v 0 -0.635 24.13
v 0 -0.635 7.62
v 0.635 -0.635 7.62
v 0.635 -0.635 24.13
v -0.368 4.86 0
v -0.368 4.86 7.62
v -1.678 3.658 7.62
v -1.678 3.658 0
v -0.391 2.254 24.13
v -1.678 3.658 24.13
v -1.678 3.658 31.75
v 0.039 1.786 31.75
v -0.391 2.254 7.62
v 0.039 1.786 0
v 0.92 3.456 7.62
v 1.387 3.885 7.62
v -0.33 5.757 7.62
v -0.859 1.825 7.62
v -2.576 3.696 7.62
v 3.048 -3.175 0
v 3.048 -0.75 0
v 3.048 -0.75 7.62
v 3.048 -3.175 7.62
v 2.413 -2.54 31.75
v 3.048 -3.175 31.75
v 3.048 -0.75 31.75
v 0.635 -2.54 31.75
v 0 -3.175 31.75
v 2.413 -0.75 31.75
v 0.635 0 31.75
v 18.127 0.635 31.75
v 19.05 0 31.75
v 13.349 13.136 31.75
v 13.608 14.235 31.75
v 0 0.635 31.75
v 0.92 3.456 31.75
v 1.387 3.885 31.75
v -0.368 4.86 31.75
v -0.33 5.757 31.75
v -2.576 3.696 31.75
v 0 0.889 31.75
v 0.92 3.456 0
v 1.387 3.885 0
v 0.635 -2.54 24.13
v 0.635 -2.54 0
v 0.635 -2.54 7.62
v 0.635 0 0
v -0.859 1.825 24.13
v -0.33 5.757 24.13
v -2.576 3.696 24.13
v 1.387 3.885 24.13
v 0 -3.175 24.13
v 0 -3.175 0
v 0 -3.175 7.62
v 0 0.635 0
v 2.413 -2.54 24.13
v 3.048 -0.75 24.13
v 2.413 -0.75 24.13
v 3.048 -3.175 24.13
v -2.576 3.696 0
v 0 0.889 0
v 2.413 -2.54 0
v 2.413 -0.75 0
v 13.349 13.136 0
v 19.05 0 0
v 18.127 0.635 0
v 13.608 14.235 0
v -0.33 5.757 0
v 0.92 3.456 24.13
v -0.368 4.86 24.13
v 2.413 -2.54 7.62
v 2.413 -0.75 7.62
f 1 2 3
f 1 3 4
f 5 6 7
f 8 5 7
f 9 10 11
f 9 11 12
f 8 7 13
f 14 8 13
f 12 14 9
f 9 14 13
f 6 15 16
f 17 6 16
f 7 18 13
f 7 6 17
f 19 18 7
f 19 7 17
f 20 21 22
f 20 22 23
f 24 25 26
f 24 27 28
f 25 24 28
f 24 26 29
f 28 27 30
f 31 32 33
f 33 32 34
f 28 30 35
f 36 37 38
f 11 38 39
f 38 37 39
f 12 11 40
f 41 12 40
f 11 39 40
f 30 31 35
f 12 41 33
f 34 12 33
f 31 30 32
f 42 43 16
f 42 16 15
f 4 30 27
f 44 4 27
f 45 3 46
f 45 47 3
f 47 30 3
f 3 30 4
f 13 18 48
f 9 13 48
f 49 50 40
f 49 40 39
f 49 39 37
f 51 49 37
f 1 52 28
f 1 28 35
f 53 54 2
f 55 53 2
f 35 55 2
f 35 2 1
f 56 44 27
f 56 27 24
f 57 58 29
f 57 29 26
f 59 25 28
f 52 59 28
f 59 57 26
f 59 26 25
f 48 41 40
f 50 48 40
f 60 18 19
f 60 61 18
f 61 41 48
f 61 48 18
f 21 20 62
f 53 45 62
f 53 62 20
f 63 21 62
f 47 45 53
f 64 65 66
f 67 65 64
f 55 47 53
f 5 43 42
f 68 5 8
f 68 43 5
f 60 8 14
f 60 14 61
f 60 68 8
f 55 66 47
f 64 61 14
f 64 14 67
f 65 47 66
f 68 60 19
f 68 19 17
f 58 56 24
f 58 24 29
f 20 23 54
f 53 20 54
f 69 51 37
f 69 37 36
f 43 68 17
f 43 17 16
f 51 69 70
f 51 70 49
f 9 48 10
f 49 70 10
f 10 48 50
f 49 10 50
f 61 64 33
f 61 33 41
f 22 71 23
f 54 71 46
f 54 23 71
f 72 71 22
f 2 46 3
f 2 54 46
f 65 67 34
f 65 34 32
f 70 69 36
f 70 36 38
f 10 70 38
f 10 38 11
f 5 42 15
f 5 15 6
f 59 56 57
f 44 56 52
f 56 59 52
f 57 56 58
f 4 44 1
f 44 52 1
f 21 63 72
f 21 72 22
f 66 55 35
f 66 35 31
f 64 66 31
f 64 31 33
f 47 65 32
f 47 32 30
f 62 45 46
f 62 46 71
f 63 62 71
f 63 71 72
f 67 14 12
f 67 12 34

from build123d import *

# Parameters (mm, degrees)
BOSS_EXTRUDE1_DEPTH = 31.75
SKETCH2_W           = 16.51
SKETCH2_H           = 2.54
CUT_EXTRUDE1_DEPTH  = 31.75
SKETCH3_W           = 16.51
SKETCH3_H           = 2.54
CUT_EXTRUDE2_DEPTH  = 31.75


with BuildPart() as part:
    # Sketch1 → Boss-Extrude1 (new body)
    with BuildSketch(Plane.XY):
        Polygon((2.413, -2.54), (2.413, -0.750440267), (3.048, -0.750440267), (3.048, -3.175), (0, -3.175), (0, 0.635), (18.127436567, 0.635), (13.348744151, 13.135564727), (0, 0.889), (-2.575678152, 3.696486787), (-0.329688722, 5.757029308), (1.387430046, 3.88537145), (0.919515581, 3.456091758), (-0.368323494, 4.859835152), (-1.678483995, 3.657852015), (0.038634773, 1.786194156), (13.608154244, 14.235305222), (19.05, 0), (0.635, 0), (0.635, -2.54), align=None)
    extrude(amount=BOSS_EXTRUDE1_DEPTH)

    # Sketch2 → Cut-Extrude1 (cut)
    with BuildSketch(Plane(origin=(0.442854564, 0.406288938, 0), x_dir=(0, 0, 1), z_dir=(-0.7368731724730907, -0.676031010893319, 0))):
        with Locations((15.875, 3.19508025)):
            Rectangle(SKETCH2_W, SKETCH2_H)
    extrude(amount=-CUT_EXTRUDE1_DEPTH, mode=Mode.SUBTRACT)

    # Sketch3 → Cut-Extrude2 (cut)
    with BuildSketch(Plane.ZY):
        with Locations((15.875, -1.905)):
            Rectangle(SKETCH3_W, SKETCH3_H)
    extrude(amount=-CUT_EXTRUDE2_DEPTH, mode=Mode.SUBTRACT)


solid = part.part
